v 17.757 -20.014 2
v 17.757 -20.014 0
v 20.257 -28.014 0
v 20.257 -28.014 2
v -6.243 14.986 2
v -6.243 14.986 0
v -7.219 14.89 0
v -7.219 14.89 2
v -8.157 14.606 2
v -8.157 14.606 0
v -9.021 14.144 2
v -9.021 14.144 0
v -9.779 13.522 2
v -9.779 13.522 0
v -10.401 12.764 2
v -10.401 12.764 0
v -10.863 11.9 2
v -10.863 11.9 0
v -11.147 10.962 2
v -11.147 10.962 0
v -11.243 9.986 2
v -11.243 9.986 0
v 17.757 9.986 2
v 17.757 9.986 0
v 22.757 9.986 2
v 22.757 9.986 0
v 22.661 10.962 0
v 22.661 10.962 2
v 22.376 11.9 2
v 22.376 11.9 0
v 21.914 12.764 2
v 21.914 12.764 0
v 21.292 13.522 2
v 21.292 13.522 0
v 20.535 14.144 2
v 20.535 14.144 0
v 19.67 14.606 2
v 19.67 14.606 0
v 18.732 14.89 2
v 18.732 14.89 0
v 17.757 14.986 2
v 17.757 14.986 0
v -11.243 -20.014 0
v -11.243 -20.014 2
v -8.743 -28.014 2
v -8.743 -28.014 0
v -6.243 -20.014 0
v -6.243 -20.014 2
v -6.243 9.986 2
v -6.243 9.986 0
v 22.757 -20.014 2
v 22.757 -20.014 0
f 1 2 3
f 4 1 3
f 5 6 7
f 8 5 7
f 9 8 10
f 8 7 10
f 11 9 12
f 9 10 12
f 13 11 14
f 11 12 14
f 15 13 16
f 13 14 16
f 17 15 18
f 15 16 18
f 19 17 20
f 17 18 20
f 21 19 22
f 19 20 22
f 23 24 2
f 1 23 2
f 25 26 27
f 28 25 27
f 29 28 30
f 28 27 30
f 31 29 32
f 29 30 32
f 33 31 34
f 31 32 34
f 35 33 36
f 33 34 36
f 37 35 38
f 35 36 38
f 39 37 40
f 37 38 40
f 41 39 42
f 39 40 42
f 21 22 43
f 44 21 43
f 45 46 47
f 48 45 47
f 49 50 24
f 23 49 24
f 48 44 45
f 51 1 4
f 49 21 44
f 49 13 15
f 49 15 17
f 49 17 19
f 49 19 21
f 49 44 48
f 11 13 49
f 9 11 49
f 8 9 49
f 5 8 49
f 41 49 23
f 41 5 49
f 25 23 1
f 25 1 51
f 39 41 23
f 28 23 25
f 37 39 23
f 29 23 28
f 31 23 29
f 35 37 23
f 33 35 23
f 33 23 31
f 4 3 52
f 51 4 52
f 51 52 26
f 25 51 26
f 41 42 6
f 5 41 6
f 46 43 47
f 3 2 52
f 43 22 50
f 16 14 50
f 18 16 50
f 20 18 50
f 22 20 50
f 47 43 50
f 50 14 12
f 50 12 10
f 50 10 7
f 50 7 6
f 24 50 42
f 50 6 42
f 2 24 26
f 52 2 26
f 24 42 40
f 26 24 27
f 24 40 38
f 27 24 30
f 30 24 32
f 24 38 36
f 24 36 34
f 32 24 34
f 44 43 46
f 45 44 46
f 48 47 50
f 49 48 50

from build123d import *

# Parameters (mm, degrees)
F1_DEPTH = 2


with BuildPart() as f1:
    # F0 (on Top) → F1 (new body)
    with BuildSketch(Plane.XY):
        with BuildLine():
            Line((-11.243236, 9.986477), (-11.243236, -20.013523))
            Line((-11.243236, -20.013523), (-8.743236, -28.013523))
            Line((-8.743236, -28.013523), (-6.243236, -20.013523))
            Line((-6.243236, -20.013523), (-6.243236, 9.986477))
            Line((-6.243236, 9.986477), (17.756764, 9.986477))
            Line((17.756764, 9.986477), (17.756764, -20.013523))
            Line((17.756764, -20.013523), (20.256763, -28.013523))
            Line((20.256763, -28.013523), (22.756764, -20.013523))
            Line((22.756764, -20.013523), (22.756764, 9.986477))
            ThreePointArc((22.756764, 9.986477), (21.292298, 13.522011), (17.756764, 14.986477))
            Line((17.756764, 14.986477), (-6.243236, 14.986477))
            ThreePointArc((-6.243236, 14.986477), (-9.77877, 13.522011), (-11.243236, 9.986477))
        make_face()
    extrude(amount=F1_DEPTH)


solid = f1.part
